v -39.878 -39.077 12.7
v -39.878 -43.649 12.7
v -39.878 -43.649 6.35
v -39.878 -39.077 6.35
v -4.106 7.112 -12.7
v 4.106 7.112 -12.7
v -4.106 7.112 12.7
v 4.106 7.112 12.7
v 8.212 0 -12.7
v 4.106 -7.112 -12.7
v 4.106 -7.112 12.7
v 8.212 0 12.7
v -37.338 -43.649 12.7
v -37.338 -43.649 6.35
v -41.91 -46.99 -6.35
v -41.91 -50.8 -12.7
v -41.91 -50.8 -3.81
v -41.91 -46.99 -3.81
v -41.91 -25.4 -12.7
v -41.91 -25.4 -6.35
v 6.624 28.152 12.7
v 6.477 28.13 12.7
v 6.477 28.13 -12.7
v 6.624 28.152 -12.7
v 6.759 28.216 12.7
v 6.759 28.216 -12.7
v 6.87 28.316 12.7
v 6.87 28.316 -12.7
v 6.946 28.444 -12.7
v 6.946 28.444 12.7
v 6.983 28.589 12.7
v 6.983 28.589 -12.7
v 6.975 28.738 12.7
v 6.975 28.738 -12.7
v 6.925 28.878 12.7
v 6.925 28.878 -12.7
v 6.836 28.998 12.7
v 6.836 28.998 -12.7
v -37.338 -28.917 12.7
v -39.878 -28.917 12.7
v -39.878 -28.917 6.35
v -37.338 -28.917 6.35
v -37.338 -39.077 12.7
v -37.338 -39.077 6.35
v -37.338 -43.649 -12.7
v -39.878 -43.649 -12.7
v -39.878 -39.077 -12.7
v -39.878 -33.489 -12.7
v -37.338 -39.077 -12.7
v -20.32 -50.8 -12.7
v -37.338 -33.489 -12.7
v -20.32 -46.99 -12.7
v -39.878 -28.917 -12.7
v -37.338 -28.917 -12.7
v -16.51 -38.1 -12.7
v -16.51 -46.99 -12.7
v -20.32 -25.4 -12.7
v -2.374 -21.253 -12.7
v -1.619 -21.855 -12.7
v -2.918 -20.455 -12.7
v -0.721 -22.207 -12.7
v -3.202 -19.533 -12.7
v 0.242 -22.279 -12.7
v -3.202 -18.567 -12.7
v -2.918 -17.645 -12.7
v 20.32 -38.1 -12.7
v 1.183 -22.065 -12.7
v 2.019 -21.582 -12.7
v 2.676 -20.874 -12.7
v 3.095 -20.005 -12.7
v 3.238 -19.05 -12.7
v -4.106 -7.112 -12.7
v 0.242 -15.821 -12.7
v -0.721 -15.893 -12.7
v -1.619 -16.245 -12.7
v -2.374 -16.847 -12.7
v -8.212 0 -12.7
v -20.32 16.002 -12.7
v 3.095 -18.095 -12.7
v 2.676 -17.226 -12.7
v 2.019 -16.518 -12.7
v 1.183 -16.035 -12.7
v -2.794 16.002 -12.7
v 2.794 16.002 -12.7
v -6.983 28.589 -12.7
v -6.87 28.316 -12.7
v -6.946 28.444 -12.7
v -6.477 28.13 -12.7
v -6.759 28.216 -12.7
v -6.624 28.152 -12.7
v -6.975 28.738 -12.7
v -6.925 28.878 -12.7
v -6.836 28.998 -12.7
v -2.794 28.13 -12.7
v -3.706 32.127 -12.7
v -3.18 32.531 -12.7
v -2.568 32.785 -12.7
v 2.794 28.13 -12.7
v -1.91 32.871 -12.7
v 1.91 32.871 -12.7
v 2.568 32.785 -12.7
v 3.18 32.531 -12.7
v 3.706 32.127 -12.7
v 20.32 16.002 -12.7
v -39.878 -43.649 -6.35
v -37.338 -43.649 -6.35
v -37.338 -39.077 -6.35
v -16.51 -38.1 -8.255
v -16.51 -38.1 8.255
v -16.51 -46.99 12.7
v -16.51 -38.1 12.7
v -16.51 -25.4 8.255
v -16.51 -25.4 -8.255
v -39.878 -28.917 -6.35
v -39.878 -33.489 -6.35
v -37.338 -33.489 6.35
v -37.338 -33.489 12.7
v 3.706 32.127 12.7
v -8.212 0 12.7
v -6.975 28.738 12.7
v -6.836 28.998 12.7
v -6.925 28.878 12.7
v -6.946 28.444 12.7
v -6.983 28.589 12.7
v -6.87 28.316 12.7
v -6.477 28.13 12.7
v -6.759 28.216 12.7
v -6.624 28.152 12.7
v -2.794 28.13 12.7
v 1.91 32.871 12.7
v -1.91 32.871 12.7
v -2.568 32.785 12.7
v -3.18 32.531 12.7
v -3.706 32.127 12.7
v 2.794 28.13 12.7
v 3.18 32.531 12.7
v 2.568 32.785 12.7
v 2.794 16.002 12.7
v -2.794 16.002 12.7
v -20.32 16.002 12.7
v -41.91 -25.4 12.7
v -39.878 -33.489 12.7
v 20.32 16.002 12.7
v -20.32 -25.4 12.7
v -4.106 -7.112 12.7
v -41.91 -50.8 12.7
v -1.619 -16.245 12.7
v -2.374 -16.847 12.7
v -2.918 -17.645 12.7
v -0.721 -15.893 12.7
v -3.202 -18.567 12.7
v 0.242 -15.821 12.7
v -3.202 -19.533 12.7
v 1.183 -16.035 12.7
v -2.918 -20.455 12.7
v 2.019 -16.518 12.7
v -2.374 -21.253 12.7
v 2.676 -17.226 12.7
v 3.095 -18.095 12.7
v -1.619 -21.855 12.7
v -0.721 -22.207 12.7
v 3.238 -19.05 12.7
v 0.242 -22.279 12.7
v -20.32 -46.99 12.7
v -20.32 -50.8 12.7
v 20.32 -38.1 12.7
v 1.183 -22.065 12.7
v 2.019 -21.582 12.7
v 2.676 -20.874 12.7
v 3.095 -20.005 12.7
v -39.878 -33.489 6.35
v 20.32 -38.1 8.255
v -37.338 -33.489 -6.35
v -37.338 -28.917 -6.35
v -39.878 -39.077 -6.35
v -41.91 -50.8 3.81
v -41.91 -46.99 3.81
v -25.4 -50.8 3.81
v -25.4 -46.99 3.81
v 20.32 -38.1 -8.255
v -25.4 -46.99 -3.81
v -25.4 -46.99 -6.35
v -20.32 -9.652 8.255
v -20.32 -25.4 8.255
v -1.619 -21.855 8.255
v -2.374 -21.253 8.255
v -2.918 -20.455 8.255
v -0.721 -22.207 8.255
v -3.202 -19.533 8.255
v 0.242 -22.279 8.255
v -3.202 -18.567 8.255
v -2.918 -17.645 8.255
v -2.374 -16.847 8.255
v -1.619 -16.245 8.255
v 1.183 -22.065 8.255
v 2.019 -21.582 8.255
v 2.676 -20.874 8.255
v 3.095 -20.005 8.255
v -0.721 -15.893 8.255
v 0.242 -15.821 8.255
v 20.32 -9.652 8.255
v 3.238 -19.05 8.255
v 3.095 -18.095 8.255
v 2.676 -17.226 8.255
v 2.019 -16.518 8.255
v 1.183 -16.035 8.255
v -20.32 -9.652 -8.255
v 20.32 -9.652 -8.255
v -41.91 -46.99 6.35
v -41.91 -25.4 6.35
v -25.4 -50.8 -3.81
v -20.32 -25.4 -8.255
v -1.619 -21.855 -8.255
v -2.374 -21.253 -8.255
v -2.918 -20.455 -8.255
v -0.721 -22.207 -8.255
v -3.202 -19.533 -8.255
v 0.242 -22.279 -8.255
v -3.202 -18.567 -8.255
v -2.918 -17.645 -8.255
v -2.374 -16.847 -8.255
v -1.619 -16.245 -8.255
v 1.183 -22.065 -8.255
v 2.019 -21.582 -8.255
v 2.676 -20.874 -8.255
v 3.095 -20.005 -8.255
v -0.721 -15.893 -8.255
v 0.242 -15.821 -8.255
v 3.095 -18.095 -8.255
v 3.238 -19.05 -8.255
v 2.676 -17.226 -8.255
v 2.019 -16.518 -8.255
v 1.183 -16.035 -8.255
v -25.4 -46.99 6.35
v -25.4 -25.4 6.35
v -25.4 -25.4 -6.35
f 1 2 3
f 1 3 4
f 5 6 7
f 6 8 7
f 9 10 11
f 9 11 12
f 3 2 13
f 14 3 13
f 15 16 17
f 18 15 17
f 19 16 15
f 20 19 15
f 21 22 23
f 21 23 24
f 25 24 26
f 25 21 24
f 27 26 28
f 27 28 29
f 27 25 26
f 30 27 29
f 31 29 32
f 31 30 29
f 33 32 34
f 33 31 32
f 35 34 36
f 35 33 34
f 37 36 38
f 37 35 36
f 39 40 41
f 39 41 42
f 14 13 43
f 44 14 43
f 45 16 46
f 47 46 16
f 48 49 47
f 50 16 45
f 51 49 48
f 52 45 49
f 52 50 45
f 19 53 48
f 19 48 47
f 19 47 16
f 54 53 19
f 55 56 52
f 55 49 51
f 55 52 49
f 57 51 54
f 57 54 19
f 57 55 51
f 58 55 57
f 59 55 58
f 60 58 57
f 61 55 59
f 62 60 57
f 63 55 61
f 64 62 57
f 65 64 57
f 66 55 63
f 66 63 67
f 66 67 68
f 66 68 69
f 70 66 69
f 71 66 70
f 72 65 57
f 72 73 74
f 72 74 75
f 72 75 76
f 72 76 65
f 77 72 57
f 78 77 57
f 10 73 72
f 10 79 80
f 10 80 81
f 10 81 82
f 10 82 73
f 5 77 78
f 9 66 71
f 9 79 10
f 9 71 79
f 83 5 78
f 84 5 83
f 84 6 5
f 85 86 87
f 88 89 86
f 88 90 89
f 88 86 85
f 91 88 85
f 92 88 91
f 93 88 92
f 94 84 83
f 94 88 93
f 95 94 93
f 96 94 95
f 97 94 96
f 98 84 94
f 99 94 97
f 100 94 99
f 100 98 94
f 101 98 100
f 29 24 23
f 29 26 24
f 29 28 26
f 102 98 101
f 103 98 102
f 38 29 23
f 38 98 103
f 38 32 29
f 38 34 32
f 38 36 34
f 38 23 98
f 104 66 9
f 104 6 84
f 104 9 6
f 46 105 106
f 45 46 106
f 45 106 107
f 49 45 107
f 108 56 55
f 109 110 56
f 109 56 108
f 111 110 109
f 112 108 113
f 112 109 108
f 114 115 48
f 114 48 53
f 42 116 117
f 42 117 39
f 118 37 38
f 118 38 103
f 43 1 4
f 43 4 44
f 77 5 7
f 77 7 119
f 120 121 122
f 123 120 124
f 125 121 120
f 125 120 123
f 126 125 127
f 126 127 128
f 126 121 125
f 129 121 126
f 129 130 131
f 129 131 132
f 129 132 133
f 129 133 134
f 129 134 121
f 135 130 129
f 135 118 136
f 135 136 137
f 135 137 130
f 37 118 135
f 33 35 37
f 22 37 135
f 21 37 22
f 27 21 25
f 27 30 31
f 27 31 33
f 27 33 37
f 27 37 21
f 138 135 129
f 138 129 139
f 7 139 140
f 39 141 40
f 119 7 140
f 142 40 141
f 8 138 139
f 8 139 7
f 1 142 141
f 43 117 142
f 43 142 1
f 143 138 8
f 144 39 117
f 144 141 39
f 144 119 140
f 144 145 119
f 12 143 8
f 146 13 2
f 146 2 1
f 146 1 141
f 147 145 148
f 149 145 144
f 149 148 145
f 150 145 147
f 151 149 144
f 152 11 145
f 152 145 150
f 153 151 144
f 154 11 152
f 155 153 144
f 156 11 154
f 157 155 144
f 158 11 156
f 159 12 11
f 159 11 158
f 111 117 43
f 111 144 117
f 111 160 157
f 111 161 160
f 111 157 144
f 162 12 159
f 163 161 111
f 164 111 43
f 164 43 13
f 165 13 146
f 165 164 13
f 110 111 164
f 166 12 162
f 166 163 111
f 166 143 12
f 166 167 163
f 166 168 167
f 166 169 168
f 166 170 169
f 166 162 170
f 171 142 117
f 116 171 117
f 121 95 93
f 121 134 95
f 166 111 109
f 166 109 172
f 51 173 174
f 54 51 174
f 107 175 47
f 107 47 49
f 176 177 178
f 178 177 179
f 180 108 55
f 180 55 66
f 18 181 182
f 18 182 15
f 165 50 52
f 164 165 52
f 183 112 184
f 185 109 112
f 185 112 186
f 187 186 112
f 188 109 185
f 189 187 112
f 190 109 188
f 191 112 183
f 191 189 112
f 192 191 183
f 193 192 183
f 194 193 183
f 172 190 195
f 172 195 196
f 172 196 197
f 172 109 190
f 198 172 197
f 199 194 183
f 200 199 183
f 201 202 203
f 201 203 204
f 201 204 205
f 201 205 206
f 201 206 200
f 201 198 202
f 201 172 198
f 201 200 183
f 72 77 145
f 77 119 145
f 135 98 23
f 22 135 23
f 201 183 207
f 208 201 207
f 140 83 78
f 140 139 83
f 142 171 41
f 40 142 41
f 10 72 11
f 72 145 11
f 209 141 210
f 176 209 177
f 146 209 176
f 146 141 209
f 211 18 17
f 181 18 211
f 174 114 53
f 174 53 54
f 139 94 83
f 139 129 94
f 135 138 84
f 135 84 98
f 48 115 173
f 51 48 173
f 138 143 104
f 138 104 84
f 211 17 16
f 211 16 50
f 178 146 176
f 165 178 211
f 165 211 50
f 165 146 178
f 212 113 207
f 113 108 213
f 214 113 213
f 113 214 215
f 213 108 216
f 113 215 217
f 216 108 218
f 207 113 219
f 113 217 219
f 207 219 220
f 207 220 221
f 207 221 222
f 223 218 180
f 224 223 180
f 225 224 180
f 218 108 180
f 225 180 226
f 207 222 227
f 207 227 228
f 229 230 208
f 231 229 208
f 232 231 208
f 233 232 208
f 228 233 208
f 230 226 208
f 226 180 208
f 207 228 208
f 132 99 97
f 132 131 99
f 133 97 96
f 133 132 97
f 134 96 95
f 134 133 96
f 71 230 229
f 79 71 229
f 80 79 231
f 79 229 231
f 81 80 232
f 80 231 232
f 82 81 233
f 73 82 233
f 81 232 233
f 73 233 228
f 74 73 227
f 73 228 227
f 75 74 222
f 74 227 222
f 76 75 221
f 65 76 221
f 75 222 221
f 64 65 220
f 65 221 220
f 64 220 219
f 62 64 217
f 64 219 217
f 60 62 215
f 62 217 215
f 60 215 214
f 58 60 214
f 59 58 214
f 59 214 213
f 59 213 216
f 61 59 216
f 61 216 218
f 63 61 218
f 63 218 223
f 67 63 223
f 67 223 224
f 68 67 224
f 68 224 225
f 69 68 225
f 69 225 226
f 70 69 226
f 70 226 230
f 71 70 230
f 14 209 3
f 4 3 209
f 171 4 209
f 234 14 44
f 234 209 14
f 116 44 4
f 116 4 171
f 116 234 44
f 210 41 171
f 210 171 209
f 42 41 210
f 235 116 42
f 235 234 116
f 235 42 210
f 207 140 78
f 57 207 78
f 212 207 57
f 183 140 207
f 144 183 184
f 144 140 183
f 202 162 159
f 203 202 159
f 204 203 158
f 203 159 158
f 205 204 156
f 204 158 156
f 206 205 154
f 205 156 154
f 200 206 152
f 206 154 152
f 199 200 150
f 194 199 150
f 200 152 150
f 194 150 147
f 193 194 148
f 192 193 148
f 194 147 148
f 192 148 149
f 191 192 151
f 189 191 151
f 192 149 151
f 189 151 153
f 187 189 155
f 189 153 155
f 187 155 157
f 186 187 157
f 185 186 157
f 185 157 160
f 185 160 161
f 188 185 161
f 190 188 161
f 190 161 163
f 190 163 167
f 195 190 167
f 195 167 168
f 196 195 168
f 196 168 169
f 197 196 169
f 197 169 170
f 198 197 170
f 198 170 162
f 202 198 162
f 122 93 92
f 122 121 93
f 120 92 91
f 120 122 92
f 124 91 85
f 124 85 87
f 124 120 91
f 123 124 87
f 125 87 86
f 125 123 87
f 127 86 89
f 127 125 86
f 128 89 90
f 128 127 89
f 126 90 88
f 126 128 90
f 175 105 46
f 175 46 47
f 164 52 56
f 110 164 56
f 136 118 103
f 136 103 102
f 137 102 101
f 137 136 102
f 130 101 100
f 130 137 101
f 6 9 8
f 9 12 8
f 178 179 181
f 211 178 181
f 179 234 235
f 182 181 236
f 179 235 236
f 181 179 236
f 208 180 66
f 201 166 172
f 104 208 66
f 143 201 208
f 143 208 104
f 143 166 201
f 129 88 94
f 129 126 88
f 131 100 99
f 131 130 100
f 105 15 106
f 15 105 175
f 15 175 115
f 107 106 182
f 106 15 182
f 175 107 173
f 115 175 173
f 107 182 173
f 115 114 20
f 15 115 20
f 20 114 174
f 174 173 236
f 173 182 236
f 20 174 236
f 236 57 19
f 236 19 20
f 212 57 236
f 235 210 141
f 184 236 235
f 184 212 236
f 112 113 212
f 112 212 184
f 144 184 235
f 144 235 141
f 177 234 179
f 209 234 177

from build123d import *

# Parameters (mm, degrees)
BOSS_EXTRUDE1_DEPTH             = 12.7
BOSS_EXTRUDE4_REACH             = 14.7
BOSS_EXTRUDE4_DIRECTION_2_REACH = 14.7
SKETCH6_W                       = 16.51
SKETCH6_H                       = 15.748
CUT_EXTRUDE2_DEPTH              = 63.23
SKETCH11_W                      = 21.59
SKETCH11_H                      = 7.62
CUT_EXTRUDE3_DEPTH              = 3.81
SKETCH15_R                      = 3.2385
CUT_EXTRUDE4_DEPTH              = 25.4
SKETCH16_W                      = 16.51
SKETCH16_H                      = 12.7
CUT_EXTRUDE5_DEPTH              = 36.83
BOSS_EXTRUDE5_DEPTH             = 5.08
SKETCH18_W                      = 6.35
SKETCH18_H                      = 21.59
BOSS_EXTRUDE6_DEPTH             = 16.51
SKETCH22_W                      = 3.81
SKETCH22_H                      = 3.81
CUT_EXTRUDE6_DEPTH              = 25.4
SKETCH23_W                      = 2.54
SKETCH23_H                      = 4.572
CUT_EXTRUDE7_DEPTH              = 26.4


with BuildPart() as part:
    # Sketch1 → Boss-Extrude1 (new body, symmetric)
    with BuildSketch(Plane.XY):
        with BuildLine():
            Line((-20.32, 16.002), (-20.32, -38.1))
            Line((-20.32, -38.1), (20.32, -38.1))
            Line((20.32, -38.1), (20.32, 16.002))
            Line((20.32, 16.002), (2.794, 16.002))
            Line((2.794, 16.002), (2.794, 28.1305))
            Line((2.794, 28.1305), (6.477, 28.1305))
            ThreePointArc((6.477, 28.1305), (6.946330803, 28.444096816), (6.836210245, 28.997710245))
            Line((6.836210245, 28.997710245), (3.706459265, 32.127461224))
            ThreePointArc((3.706459265, 32.127461224), (2.882423959, 32.678064013), (1.910408041, 32.87141))
            Line((1.910408041, 32.87141), (-1.910408041, 32.87141))
            ThreePointArc((-1.910408041, 32.87141), (-2.882423959, 32.678064013), (-3.706459265, 32.127461224))
            Line((-3.706459265, 32.127461224), (-6.836210245, 28.997710245))
            ThreePointArc((-6.836210245, 28.997710245), (-6.946330803, 28.444096816), (-6.477, 28.1305))
            Line((-6.477, 28.1305), (-2.794, 28.1305))
            Line((-2.794, 28.1305), (-2.794, 16.002))
            Line((-2.794, 16.002), (-20.32, 16.002))
        make_face()
        Polygon((-4.106115114, 7.112), (-8.212230229, 0), (-4.106115114, -7.112), (4.106115114, -7.112), (8.212230229, 0), (4.106115114, 7.112), align=None, mode=Mode.SUBTRACT)
    extrude(amount=BOSS_EXTRUDE1_DEPTH, both=True)

    # Boss-Extrude4: up to this face of the body (flat: up to its plane)
    boss_extrude4_end = Plane(part.part.faces().sort_by_distance((0, -9.949298675, 12.7))[0])
    # Sketch10 → Boss-Extrude4 (add, up to the picked face)
    with BuildSketch(Plane.XY, mode=Mode.PRIVATE) as boss_extrude4_sk1:
        Polygon((-20.32, -38.1), (-20.32, -46.99), (-41.91, -46.99), (-41.91, -50.8), (-16.51, -50.8), (-16.51, -38.1), align=None)
    boss_extrude4_tool1 = split(extrude(boss_extrude4_sk1.sketch, amount=BOSS_EXTRUDE4_REACH, mode=Mode.PRIVATE), bisect_by=boss_extrude4_end, keep=Keep.BOTH, mode=Mode.PRIVATE)
    add(boss_extrude4_tool1.solids().sort_by_distance((-26.411296, -47.248704, 0))[0])

    # Boss-Extrude4 direction 2: up to this face of the body (flat: up to its plane)
    boss_extrude4_direction_2_end = Plane(part.part.faces().sort_by_distance((0, -9.949298675, -12.7))[0])
    # Sketch10 → Boss-Extrude4 direction 2 (add, up to the picked face)
    with BuildSketch(Plane.XY, mode=Mode.PRIVATE) as boss_extrude4_direction_2_sk1:
        Polygon((-20.32, -38.1), (-20.32, -46.99), (-41.91, -46.99), (-41.91, -50.8), (-16.51, -50.8), (-16.51, -38.1), align=None)
    boss_extrude4_direction_2_tool1 = split(extrude(boss_extrude4_direction_2_sk1.sketch, amount=-BOSS_EXTRUDE4_DIRECTION_2_REACH, mode=Mode.PRIVATE), bisect_by=boss_extrude4_direction_2_end, keep=Keep.BOTH, mode=Mode.PRIVATE)
    add(boss_extrude4_direction_2_tool1.solids().sort_by_distance((-26.411296, -47.248704, 0))[0])

    # Sketch6 → Cut-Extrude2 (cut, through all)
    with BuildSketch(Plane(origin=(20.32, 0, 0), x_dir=(0, 0, -1), z_dir=(1, 0, 0))):
        with Locations((0, -17.526)):
            Rectangle(SKETCH6_W, SKETCH6_H)
    extrude(amount=-CUT_EXTRUDE2_DEPTH, mode=Mode.SUBTRACT)

    # Sketch11 → Cut-Extrude3 (cut)
    with BuildSketch(Plane(origin=(0, -46.99, 0), x_dir=(1, 0, 0), z_dir=(0, 1, 0))):
        with Locations((-31.115, 0)):
            Rectangle(SKETCH11_W, SKETCH11_H)
    extrude(amount=-CUT_EXTRUDE3_DEPTH, mode=Mode.SUBTRACT)

    # Sketch15 → Cut-Extrude4 (cut)
    with BuildSketch(Plane.XY.offset(12.7)):
        with Locations((0, -19.05)):
            Circle(SKETCH15_R)
    extrude(amount=-CUT_EXTRUDE4_DEPTH, mode=Mode.SUBTRACT)

    # Sketch16 → Cut-Extrude5 (cut)
    with BuildSketch(Plane(origin=(20.32, 0, 0), x_dir=(0, 0, -1), z_dir=(1, 0, 0))):
        with Locations((0, -31.75)):
            Rectangle(SKETCH16_W, SKETCH16_H)
    extrude(amount=-CUT_EXTRUDE5_DEPTH, mode=Mode.SUBTRACT)

    # Sketch17 → Boss-Extrude5 (add)
    with BuildSketch(Plane.ZY.offset(20.32)):
        Polygon((12.7, -25.4), (12.7, -46.99), (3.81, -46.99), (3.81, -50.8), (-3.81, -50.8), (-3.81, -46.99), (-12.7, -46.99), (-12.7, -25.4), align=None)
    extrude(amount=BOSS_EXTRUDE5_DEPTH)

    # Sketch18 → Boss-Extrude6 (add)
    with BuildSketch(Plane.ZY.offset(25.4)):
        with Locations((-9.525, -36.195)):
            Rectangle(SKETCH18_W, SKETCH18_H)
        with Locations((9.525, -36.195)):
            Rectangle(SKETCH18_W, SKETCH18_H)
    extrude(amount=BOSS_EXTRUDE6_DEPTH)

    # Sketch22 → Cut-Extrude6 (cut)
    with BuildSketch(Plane.XY.offset(12.7)):
        with Locations((-18.415, -48.895)):
            Rectangle(SKETCH22_W, SKETCH22_H)
    extrude(amount=-CUT_EXTRUDE6_DEPTH, mode=Mode.SUBTRACT)

    # Sketch23 → Cut-Extrude7 (cut, through all)
    with BuildSketch(Plane.XY.offset(12.7)):
        with Locations((-38.608, -31.203491357)):
            Rectangle(SKETCH23_W, SKETCH23_H)
        with Locations((-38.608, -41.363491357)):
            Rectangle(SKETCH23_W, SKETCH23_H)
    extrude(amount=-CUT_EXTRUDE7_DEPTH, mode=Mode.SUBTRACT)


solid = part.part
